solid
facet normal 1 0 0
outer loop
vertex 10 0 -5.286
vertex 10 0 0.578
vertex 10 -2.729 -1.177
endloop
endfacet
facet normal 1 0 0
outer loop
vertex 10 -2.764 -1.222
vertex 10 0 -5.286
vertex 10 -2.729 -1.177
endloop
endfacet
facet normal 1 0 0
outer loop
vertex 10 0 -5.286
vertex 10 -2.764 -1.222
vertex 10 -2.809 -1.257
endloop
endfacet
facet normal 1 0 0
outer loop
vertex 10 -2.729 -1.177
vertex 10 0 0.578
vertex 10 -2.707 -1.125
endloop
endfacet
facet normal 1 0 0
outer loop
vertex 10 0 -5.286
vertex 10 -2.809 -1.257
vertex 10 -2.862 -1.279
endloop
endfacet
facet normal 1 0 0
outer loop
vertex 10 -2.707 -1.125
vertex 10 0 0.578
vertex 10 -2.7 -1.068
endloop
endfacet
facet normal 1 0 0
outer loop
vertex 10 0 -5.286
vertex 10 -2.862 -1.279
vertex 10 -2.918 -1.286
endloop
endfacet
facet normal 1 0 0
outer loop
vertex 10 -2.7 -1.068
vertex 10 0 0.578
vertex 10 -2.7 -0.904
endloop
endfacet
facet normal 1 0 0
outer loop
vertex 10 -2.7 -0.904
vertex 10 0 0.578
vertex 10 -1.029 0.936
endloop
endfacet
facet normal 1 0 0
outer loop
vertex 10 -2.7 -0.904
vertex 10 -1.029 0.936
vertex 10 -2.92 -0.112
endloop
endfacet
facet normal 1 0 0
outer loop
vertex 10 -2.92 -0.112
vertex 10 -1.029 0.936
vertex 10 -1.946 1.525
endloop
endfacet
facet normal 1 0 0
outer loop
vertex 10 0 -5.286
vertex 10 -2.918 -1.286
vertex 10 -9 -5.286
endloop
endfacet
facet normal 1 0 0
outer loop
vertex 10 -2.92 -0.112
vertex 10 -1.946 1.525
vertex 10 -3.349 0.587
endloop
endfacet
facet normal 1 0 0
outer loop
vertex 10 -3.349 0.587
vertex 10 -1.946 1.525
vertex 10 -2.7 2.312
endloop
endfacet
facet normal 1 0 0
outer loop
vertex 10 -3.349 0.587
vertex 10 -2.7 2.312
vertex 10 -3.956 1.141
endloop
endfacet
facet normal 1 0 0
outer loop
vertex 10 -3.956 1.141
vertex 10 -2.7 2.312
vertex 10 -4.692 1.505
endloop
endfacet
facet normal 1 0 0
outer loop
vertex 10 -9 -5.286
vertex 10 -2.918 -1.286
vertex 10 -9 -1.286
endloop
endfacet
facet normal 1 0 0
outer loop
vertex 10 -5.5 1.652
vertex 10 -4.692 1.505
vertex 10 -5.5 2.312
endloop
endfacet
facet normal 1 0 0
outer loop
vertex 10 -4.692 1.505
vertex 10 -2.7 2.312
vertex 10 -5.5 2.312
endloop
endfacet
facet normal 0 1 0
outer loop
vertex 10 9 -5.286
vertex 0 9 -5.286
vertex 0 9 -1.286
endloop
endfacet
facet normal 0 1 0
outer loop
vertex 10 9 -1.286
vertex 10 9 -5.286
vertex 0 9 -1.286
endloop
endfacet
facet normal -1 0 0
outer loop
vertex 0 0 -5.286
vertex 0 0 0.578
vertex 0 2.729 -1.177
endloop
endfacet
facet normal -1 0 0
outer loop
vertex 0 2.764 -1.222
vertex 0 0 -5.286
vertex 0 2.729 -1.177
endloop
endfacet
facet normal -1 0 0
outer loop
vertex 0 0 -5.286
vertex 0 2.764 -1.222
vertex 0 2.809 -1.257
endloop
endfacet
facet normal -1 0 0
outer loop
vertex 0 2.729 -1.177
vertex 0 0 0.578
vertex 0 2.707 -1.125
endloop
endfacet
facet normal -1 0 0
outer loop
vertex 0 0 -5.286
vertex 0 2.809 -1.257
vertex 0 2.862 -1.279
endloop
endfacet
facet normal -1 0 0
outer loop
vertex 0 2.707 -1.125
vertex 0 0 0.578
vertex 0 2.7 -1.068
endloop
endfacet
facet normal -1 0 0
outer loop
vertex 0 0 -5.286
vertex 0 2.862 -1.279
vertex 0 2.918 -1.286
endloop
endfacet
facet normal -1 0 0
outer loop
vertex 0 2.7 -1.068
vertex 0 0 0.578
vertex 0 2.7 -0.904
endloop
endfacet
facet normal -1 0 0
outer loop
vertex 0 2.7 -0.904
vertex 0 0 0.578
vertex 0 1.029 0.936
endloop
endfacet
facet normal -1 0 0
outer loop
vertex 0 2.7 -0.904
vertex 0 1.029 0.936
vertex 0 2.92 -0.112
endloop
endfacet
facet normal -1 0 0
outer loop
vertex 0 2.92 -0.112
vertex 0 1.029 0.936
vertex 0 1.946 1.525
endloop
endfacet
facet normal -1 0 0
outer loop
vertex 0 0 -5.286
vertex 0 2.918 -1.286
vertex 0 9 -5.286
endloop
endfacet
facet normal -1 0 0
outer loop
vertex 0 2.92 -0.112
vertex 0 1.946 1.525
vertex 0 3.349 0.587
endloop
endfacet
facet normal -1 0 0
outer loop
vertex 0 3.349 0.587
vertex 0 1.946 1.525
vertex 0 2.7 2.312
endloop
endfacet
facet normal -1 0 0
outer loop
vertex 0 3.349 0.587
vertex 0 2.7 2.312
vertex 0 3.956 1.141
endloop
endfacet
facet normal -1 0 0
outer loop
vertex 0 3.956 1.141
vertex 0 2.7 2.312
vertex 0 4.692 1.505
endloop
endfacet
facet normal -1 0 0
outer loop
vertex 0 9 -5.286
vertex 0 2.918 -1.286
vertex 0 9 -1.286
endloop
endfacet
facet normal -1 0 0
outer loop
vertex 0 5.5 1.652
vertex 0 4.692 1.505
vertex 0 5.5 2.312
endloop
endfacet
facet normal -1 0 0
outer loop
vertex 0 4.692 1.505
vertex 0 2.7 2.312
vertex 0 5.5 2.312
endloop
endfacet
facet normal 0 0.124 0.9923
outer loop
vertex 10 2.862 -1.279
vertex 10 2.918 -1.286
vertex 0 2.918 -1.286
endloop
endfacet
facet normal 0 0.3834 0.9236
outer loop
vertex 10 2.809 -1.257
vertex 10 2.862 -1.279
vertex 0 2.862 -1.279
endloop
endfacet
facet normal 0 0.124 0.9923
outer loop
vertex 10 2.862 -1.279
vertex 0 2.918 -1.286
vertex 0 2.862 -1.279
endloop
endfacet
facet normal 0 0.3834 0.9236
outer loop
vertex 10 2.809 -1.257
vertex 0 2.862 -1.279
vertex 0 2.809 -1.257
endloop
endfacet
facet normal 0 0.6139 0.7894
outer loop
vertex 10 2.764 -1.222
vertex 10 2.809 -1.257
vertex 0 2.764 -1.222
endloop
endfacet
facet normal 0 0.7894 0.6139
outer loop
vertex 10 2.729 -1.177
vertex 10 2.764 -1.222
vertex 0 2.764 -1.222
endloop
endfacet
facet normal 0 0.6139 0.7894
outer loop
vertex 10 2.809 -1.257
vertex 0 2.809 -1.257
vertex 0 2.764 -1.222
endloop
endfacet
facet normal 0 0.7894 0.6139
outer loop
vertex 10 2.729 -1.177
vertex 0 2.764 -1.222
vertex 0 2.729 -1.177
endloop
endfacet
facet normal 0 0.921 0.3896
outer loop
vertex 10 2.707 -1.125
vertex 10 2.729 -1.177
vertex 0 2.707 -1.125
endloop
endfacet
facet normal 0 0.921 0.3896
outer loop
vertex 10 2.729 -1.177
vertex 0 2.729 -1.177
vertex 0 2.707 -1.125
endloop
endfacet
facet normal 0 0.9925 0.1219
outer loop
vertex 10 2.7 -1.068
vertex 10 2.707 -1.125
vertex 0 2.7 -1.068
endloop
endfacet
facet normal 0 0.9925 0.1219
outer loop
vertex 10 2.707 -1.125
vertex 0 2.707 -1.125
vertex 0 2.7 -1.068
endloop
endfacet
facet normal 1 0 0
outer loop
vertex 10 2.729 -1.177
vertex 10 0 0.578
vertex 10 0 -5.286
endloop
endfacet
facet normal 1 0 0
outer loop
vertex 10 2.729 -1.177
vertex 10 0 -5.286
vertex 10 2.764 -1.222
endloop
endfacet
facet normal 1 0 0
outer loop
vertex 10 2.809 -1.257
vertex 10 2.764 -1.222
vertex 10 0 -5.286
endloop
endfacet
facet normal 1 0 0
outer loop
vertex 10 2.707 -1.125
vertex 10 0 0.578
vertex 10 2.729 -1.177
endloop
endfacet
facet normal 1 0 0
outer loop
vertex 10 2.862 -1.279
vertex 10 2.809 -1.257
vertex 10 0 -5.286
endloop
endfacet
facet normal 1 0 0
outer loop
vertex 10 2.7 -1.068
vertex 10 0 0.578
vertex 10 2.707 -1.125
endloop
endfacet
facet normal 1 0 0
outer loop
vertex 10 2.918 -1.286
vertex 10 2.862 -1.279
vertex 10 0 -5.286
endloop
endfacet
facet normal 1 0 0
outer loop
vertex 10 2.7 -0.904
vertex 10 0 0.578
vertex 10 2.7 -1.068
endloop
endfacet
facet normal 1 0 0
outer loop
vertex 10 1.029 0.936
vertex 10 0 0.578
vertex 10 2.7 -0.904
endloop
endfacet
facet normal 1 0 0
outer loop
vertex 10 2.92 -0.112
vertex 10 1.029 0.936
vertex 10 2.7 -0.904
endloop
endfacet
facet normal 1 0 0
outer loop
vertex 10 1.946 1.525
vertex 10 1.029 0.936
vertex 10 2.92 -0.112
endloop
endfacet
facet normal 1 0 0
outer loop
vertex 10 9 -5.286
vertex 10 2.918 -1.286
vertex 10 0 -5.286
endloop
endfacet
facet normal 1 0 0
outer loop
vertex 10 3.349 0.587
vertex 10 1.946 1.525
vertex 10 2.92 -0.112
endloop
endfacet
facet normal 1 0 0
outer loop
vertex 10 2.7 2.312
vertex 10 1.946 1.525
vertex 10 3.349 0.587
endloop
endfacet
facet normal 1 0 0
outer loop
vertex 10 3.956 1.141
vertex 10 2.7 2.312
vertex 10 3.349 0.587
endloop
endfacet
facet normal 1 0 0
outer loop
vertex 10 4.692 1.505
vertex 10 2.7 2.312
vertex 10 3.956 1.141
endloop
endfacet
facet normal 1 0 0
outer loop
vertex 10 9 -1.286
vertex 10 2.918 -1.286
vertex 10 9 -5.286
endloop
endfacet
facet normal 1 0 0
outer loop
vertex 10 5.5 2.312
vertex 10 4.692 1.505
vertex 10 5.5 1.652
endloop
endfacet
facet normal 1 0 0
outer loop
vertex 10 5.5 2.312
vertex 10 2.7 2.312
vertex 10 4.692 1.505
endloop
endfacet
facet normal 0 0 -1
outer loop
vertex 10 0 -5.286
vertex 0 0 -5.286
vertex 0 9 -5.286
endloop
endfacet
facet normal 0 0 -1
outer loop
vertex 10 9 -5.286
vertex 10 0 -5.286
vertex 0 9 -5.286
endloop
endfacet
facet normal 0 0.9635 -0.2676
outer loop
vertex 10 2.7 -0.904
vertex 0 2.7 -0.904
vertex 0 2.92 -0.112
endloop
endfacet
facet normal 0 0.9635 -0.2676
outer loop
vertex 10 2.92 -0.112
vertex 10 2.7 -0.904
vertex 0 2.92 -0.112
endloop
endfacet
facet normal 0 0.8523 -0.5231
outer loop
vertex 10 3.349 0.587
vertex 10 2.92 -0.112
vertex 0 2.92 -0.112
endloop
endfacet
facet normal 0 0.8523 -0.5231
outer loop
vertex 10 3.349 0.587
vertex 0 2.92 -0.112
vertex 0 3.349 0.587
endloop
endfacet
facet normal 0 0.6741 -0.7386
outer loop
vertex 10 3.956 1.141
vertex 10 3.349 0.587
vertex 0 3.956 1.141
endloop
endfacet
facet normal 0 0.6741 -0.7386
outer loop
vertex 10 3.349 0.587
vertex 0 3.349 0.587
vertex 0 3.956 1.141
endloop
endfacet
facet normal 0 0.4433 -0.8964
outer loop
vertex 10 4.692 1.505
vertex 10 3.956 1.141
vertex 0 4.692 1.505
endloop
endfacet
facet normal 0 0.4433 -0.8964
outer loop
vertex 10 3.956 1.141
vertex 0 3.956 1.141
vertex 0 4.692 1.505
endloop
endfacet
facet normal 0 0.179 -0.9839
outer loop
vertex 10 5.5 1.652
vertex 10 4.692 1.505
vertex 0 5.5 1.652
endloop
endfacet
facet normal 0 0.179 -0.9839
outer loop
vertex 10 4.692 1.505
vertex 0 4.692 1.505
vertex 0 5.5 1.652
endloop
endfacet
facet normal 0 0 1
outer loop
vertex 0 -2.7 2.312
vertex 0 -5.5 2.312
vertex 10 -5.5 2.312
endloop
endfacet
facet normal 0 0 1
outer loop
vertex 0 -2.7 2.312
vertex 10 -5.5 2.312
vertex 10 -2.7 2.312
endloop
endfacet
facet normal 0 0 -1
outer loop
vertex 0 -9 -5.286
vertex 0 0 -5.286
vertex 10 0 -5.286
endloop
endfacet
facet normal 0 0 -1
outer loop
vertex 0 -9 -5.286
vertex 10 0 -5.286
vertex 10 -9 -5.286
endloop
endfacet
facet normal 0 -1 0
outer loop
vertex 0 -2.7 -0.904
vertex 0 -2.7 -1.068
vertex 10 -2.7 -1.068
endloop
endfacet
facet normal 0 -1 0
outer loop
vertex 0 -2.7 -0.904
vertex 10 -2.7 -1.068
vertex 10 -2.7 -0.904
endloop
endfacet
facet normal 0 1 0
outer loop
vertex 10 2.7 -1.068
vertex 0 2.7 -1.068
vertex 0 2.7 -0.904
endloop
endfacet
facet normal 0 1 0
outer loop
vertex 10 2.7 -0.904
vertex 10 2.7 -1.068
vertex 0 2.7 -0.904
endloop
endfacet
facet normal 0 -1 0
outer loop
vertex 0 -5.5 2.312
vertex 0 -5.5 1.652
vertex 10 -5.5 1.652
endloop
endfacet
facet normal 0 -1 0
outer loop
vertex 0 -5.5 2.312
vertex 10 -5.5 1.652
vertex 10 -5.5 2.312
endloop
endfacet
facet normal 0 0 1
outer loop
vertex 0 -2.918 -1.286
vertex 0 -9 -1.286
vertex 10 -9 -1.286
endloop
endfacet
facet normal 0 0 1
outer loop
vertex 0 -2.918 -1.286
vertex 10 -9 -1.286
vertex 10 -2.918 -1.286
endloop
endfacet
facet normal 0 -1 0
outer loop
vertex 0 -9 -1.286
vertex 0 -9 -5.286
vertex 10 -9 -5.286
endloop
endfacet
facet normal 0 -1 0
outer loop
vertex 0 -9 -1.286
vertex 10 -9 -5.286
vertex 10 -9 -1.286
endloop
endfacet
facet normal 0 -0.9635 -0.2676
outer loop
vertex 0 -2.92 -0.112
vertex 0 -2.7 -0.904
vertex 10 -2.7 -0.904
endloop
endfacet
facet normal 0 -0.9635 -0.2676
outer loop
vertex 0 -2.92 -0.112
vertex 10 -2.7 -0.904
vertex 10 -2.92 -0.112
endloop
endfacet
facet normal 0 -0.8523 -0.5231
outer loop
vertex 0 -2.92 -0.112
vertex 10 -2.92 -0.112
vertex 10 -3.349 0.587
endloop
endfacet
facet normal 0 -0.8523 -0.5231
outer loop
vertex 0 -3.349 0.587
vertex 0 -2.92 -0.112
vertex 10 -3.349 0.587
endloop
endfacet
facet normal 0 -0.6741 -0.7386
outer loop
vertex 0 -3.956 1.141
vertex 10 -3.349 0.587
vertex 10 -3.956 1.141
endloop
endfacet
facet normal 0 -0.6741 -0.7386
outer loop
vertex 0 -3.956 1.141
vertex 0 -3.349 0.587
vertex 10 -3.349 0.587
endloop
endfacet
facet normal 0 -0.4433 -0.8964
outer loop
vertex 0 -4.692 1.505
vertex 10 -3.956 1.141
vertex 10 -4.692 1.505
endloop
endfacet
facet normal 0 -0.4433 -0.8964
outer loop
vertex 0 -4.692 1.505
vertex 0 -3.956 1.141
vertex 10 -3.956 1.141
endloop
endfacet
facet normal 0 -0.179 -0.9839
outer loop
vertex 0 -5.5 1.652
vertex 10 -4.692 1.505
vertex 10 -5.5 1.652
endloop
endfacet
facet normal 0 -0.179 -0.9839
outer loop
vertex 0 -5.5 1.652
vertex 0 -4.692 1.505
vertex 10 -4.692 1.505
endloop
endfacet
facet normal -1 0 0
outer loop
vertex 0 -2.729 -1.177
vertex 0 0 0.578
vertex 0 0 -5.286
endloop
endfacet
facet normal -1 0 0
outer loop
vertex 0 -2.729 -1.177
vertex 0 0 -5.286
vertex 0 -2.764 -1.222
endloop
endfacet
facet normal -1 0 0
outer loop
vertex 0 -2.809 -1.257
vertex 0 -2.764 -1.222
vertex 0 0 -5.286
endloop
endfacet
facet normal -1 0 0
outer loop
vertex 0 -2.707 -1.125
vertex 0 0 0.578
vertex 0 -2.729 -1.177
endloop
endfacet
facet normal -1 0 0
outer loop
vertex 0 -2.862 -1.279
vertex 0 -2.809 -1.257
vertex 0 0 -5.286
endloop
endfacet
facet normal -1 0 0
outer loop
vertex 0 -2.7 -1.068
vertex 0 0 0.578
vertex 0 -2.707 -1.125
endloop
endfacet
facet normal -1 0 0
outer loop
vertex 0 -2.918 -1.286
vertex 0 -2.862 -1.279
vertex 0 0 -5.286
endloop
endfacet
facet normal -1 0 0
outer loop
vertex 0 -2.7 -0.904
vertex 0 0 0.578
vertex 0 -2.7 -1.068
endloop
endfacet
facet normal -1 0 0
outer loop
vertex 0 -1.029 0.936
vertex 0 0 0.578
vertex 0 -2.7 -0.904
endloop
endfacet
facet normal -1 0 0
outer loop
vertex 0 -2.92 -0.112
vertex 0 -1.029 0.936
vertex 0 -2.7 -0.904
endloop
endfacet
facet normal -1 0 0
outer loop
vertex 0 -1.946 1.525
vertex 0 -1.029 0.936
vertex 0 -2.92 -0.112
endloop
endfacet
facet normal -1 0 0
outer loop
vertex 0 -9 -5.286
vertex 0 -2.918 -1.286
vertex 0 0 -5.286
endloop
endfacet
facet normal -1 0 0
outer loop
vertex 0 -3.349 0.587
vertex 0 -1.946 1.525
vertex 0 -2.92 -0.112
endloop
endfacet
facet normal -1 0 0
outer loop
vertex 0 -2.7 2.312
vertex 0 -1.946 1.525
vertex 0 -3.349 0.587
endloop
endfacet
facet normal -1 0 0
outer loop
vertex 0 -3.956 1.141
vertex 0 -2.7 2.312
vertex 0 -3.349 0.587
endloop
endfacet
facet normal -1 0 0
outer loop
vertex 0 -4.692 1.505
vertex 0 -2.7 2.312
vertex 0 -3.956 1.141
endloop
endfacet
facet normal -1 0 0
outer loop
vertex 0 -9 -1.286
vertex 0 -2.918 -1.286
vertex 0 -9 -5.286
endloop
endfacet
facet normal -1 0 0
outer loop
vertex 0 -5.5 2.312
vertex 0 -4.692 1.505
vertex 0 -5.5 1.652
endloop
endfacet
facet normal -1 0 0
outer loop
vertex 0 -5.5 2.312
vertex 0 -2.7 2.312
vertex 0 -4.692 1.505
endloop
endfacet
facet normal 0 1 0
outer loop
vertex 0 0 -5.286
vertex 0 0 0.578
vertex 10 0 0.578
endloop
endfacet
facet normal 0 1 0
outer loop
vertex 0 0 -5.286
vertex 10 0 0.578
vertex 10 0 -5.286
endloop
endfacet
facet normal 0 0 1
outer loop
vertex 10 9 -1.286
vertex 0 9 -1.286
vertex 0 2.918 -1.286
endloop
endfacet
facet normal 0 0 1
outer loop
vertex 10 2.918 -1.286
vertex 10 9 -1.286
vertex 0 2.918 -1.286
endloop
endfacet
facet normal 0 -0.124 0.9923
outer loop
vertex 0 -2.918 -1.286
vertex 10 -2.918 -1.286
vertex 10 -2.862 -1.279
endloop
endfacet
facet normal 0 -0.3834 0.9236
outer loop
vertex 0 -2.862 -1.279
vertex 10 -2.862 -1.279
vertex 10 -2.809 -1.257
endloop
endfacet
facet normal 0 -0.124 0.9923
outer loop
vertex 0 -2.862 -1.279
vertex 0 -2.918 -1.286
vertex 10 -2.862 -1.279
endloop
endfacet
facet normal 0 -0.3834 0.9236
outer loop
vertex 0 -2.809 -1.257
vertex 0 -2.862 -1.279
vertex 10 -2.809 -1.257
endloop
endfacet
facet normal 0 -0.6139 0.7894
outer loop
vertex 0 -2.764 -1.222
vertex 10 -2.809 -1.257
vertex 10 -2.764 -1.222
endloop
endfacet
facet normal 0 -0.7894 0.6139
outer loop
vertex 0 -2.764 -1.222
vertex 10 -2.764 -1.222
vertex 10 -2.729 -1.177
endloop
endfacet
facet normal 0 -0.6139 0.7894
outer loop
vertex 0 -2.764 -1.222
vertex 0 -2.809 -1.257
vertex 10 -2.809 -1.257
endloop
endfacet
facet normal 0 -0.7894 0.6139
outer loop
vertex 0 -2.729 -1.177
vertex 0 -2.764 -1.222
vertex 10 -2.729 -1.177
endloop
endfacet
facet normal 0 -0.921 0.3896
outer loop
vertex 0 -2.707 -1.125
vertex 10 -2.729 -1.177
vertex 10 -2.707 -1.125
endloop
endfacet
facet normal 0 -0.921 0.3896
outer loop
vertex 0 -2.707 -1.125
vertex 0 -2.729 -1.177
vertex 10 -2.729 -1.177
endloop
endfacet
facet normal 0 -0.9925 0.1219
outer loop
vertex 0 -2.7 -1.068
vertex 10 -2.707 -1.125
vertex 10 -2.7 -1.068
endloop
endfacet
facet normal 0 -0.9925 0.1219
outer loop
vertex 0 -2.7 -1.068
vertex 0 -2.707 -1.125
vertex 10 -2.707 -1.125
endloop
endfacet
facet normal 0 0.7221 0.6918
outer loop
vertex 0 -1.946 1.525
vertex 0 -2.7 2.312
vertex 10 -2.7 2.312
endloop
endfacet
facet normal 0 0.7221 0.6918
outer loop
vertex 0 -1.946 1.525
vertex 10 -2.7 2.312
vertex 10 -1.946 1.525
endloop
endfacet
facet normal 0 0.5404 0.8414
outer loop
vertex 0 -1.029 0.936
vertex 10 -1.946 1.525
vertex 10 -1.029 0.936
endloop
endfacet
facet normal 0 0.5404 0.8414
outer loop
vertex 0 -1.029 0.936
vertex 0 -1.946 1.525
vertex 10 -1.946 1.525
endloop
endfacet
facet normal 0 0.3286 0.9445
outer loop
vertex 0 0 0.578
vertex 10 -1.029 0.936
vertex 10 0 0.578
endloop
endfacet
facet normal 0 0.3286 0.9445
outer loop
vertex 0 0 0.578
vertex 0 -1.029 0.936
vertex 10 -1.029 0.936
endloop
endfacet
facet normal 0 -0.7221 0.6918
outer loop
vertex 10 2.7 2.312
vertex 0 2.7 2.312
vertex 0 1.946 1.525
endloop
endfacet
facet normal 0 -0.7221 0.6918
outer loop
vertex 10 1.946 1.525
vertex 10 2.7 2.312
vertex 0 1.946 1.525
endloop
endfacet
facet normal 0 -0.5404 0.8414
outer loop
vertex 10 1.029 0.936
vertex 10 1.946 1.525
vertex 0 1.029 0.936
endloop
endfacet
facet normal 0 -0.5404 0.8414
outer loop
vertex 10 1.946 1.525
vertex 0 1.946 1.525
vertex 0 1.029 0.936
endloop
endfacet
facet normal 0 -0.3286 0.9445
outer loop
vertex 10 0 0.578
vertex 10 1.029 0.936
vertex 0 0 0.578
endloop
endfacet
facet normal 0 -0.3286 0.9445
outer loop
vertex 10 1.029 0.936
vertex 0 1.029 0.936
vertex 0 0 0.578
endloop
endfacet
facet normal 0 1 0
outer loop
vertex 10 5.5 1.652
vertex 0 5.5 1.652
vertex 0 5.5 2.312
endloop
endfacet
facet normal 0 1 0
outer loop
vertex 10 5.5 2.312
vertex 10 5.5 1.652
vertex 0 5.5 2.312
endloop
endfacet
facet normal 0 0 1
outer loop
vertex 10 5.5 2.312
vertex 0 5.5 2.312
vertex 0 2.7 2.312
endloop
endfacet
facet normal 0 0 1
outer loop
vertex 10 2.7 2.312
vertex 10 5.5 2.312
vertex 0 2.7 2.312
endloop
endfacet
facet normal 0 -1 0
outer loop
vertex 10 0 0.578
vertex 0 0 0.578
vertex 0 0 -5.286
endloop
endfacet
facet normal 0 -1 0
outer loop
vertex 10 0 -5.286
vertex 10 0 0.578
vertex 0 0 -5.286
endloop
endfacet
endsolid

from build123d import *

# Parameters (mm, degrees)
F1_DEPTH = 10


# Not quite as in the source:
# - a pattern or mirror of a feature is missing from the dataset's text; its kind, count and spacing are read off the source's solid


with BuildPart() as f1:
    # F0 (on Right) → F1 (new body)
    with BuildSketch(Plane.YZ):
        with BuildLine():
            Line((5.5, 2.3115177173), (2.7, 2.3115177173))
            ThreePointArc((2.7, 2.3115177173), (1.5050999961, 1.2033549585), (0, 0.5784671916))
            Line((0, 0.5784671916), (0, -5.2862326842))
            Line((0, -5.2862326842), (9, -5.2862326842))
            Line((9, -5.2862326842), (9, -1.2862326842))
            Line((9, -1.2862326842), (2.9180552616, -1.2862326842))
            ThreePointArc((2.9180552616, -1.2862326842), (2.7638669074, -1.2223657768), (2.7, -1.0681774227))
            Line((2.7, -1.0681774227), (2.7, -0.9035626068))
            ThreePointArc((2.7, -0.9035626068), (3.6332473174, 0.8854712641), (5.5, 1.6515177173))
            Line((5.5, 1.6515177173), (5.5, 2.3115177173))
        make_face()
    extrude(amount=F1_DEPTH)


with BuildPart() as f1_copies_1:
    # F1_copies: instance of F1
    add(f1.part.mirror(Plane(origin=(0, 0, 0), x_dir=(0, 0, -1), z_dir=(0, -1, 0))))


solid = Compound([f1.part, f1_copies_1.part])
